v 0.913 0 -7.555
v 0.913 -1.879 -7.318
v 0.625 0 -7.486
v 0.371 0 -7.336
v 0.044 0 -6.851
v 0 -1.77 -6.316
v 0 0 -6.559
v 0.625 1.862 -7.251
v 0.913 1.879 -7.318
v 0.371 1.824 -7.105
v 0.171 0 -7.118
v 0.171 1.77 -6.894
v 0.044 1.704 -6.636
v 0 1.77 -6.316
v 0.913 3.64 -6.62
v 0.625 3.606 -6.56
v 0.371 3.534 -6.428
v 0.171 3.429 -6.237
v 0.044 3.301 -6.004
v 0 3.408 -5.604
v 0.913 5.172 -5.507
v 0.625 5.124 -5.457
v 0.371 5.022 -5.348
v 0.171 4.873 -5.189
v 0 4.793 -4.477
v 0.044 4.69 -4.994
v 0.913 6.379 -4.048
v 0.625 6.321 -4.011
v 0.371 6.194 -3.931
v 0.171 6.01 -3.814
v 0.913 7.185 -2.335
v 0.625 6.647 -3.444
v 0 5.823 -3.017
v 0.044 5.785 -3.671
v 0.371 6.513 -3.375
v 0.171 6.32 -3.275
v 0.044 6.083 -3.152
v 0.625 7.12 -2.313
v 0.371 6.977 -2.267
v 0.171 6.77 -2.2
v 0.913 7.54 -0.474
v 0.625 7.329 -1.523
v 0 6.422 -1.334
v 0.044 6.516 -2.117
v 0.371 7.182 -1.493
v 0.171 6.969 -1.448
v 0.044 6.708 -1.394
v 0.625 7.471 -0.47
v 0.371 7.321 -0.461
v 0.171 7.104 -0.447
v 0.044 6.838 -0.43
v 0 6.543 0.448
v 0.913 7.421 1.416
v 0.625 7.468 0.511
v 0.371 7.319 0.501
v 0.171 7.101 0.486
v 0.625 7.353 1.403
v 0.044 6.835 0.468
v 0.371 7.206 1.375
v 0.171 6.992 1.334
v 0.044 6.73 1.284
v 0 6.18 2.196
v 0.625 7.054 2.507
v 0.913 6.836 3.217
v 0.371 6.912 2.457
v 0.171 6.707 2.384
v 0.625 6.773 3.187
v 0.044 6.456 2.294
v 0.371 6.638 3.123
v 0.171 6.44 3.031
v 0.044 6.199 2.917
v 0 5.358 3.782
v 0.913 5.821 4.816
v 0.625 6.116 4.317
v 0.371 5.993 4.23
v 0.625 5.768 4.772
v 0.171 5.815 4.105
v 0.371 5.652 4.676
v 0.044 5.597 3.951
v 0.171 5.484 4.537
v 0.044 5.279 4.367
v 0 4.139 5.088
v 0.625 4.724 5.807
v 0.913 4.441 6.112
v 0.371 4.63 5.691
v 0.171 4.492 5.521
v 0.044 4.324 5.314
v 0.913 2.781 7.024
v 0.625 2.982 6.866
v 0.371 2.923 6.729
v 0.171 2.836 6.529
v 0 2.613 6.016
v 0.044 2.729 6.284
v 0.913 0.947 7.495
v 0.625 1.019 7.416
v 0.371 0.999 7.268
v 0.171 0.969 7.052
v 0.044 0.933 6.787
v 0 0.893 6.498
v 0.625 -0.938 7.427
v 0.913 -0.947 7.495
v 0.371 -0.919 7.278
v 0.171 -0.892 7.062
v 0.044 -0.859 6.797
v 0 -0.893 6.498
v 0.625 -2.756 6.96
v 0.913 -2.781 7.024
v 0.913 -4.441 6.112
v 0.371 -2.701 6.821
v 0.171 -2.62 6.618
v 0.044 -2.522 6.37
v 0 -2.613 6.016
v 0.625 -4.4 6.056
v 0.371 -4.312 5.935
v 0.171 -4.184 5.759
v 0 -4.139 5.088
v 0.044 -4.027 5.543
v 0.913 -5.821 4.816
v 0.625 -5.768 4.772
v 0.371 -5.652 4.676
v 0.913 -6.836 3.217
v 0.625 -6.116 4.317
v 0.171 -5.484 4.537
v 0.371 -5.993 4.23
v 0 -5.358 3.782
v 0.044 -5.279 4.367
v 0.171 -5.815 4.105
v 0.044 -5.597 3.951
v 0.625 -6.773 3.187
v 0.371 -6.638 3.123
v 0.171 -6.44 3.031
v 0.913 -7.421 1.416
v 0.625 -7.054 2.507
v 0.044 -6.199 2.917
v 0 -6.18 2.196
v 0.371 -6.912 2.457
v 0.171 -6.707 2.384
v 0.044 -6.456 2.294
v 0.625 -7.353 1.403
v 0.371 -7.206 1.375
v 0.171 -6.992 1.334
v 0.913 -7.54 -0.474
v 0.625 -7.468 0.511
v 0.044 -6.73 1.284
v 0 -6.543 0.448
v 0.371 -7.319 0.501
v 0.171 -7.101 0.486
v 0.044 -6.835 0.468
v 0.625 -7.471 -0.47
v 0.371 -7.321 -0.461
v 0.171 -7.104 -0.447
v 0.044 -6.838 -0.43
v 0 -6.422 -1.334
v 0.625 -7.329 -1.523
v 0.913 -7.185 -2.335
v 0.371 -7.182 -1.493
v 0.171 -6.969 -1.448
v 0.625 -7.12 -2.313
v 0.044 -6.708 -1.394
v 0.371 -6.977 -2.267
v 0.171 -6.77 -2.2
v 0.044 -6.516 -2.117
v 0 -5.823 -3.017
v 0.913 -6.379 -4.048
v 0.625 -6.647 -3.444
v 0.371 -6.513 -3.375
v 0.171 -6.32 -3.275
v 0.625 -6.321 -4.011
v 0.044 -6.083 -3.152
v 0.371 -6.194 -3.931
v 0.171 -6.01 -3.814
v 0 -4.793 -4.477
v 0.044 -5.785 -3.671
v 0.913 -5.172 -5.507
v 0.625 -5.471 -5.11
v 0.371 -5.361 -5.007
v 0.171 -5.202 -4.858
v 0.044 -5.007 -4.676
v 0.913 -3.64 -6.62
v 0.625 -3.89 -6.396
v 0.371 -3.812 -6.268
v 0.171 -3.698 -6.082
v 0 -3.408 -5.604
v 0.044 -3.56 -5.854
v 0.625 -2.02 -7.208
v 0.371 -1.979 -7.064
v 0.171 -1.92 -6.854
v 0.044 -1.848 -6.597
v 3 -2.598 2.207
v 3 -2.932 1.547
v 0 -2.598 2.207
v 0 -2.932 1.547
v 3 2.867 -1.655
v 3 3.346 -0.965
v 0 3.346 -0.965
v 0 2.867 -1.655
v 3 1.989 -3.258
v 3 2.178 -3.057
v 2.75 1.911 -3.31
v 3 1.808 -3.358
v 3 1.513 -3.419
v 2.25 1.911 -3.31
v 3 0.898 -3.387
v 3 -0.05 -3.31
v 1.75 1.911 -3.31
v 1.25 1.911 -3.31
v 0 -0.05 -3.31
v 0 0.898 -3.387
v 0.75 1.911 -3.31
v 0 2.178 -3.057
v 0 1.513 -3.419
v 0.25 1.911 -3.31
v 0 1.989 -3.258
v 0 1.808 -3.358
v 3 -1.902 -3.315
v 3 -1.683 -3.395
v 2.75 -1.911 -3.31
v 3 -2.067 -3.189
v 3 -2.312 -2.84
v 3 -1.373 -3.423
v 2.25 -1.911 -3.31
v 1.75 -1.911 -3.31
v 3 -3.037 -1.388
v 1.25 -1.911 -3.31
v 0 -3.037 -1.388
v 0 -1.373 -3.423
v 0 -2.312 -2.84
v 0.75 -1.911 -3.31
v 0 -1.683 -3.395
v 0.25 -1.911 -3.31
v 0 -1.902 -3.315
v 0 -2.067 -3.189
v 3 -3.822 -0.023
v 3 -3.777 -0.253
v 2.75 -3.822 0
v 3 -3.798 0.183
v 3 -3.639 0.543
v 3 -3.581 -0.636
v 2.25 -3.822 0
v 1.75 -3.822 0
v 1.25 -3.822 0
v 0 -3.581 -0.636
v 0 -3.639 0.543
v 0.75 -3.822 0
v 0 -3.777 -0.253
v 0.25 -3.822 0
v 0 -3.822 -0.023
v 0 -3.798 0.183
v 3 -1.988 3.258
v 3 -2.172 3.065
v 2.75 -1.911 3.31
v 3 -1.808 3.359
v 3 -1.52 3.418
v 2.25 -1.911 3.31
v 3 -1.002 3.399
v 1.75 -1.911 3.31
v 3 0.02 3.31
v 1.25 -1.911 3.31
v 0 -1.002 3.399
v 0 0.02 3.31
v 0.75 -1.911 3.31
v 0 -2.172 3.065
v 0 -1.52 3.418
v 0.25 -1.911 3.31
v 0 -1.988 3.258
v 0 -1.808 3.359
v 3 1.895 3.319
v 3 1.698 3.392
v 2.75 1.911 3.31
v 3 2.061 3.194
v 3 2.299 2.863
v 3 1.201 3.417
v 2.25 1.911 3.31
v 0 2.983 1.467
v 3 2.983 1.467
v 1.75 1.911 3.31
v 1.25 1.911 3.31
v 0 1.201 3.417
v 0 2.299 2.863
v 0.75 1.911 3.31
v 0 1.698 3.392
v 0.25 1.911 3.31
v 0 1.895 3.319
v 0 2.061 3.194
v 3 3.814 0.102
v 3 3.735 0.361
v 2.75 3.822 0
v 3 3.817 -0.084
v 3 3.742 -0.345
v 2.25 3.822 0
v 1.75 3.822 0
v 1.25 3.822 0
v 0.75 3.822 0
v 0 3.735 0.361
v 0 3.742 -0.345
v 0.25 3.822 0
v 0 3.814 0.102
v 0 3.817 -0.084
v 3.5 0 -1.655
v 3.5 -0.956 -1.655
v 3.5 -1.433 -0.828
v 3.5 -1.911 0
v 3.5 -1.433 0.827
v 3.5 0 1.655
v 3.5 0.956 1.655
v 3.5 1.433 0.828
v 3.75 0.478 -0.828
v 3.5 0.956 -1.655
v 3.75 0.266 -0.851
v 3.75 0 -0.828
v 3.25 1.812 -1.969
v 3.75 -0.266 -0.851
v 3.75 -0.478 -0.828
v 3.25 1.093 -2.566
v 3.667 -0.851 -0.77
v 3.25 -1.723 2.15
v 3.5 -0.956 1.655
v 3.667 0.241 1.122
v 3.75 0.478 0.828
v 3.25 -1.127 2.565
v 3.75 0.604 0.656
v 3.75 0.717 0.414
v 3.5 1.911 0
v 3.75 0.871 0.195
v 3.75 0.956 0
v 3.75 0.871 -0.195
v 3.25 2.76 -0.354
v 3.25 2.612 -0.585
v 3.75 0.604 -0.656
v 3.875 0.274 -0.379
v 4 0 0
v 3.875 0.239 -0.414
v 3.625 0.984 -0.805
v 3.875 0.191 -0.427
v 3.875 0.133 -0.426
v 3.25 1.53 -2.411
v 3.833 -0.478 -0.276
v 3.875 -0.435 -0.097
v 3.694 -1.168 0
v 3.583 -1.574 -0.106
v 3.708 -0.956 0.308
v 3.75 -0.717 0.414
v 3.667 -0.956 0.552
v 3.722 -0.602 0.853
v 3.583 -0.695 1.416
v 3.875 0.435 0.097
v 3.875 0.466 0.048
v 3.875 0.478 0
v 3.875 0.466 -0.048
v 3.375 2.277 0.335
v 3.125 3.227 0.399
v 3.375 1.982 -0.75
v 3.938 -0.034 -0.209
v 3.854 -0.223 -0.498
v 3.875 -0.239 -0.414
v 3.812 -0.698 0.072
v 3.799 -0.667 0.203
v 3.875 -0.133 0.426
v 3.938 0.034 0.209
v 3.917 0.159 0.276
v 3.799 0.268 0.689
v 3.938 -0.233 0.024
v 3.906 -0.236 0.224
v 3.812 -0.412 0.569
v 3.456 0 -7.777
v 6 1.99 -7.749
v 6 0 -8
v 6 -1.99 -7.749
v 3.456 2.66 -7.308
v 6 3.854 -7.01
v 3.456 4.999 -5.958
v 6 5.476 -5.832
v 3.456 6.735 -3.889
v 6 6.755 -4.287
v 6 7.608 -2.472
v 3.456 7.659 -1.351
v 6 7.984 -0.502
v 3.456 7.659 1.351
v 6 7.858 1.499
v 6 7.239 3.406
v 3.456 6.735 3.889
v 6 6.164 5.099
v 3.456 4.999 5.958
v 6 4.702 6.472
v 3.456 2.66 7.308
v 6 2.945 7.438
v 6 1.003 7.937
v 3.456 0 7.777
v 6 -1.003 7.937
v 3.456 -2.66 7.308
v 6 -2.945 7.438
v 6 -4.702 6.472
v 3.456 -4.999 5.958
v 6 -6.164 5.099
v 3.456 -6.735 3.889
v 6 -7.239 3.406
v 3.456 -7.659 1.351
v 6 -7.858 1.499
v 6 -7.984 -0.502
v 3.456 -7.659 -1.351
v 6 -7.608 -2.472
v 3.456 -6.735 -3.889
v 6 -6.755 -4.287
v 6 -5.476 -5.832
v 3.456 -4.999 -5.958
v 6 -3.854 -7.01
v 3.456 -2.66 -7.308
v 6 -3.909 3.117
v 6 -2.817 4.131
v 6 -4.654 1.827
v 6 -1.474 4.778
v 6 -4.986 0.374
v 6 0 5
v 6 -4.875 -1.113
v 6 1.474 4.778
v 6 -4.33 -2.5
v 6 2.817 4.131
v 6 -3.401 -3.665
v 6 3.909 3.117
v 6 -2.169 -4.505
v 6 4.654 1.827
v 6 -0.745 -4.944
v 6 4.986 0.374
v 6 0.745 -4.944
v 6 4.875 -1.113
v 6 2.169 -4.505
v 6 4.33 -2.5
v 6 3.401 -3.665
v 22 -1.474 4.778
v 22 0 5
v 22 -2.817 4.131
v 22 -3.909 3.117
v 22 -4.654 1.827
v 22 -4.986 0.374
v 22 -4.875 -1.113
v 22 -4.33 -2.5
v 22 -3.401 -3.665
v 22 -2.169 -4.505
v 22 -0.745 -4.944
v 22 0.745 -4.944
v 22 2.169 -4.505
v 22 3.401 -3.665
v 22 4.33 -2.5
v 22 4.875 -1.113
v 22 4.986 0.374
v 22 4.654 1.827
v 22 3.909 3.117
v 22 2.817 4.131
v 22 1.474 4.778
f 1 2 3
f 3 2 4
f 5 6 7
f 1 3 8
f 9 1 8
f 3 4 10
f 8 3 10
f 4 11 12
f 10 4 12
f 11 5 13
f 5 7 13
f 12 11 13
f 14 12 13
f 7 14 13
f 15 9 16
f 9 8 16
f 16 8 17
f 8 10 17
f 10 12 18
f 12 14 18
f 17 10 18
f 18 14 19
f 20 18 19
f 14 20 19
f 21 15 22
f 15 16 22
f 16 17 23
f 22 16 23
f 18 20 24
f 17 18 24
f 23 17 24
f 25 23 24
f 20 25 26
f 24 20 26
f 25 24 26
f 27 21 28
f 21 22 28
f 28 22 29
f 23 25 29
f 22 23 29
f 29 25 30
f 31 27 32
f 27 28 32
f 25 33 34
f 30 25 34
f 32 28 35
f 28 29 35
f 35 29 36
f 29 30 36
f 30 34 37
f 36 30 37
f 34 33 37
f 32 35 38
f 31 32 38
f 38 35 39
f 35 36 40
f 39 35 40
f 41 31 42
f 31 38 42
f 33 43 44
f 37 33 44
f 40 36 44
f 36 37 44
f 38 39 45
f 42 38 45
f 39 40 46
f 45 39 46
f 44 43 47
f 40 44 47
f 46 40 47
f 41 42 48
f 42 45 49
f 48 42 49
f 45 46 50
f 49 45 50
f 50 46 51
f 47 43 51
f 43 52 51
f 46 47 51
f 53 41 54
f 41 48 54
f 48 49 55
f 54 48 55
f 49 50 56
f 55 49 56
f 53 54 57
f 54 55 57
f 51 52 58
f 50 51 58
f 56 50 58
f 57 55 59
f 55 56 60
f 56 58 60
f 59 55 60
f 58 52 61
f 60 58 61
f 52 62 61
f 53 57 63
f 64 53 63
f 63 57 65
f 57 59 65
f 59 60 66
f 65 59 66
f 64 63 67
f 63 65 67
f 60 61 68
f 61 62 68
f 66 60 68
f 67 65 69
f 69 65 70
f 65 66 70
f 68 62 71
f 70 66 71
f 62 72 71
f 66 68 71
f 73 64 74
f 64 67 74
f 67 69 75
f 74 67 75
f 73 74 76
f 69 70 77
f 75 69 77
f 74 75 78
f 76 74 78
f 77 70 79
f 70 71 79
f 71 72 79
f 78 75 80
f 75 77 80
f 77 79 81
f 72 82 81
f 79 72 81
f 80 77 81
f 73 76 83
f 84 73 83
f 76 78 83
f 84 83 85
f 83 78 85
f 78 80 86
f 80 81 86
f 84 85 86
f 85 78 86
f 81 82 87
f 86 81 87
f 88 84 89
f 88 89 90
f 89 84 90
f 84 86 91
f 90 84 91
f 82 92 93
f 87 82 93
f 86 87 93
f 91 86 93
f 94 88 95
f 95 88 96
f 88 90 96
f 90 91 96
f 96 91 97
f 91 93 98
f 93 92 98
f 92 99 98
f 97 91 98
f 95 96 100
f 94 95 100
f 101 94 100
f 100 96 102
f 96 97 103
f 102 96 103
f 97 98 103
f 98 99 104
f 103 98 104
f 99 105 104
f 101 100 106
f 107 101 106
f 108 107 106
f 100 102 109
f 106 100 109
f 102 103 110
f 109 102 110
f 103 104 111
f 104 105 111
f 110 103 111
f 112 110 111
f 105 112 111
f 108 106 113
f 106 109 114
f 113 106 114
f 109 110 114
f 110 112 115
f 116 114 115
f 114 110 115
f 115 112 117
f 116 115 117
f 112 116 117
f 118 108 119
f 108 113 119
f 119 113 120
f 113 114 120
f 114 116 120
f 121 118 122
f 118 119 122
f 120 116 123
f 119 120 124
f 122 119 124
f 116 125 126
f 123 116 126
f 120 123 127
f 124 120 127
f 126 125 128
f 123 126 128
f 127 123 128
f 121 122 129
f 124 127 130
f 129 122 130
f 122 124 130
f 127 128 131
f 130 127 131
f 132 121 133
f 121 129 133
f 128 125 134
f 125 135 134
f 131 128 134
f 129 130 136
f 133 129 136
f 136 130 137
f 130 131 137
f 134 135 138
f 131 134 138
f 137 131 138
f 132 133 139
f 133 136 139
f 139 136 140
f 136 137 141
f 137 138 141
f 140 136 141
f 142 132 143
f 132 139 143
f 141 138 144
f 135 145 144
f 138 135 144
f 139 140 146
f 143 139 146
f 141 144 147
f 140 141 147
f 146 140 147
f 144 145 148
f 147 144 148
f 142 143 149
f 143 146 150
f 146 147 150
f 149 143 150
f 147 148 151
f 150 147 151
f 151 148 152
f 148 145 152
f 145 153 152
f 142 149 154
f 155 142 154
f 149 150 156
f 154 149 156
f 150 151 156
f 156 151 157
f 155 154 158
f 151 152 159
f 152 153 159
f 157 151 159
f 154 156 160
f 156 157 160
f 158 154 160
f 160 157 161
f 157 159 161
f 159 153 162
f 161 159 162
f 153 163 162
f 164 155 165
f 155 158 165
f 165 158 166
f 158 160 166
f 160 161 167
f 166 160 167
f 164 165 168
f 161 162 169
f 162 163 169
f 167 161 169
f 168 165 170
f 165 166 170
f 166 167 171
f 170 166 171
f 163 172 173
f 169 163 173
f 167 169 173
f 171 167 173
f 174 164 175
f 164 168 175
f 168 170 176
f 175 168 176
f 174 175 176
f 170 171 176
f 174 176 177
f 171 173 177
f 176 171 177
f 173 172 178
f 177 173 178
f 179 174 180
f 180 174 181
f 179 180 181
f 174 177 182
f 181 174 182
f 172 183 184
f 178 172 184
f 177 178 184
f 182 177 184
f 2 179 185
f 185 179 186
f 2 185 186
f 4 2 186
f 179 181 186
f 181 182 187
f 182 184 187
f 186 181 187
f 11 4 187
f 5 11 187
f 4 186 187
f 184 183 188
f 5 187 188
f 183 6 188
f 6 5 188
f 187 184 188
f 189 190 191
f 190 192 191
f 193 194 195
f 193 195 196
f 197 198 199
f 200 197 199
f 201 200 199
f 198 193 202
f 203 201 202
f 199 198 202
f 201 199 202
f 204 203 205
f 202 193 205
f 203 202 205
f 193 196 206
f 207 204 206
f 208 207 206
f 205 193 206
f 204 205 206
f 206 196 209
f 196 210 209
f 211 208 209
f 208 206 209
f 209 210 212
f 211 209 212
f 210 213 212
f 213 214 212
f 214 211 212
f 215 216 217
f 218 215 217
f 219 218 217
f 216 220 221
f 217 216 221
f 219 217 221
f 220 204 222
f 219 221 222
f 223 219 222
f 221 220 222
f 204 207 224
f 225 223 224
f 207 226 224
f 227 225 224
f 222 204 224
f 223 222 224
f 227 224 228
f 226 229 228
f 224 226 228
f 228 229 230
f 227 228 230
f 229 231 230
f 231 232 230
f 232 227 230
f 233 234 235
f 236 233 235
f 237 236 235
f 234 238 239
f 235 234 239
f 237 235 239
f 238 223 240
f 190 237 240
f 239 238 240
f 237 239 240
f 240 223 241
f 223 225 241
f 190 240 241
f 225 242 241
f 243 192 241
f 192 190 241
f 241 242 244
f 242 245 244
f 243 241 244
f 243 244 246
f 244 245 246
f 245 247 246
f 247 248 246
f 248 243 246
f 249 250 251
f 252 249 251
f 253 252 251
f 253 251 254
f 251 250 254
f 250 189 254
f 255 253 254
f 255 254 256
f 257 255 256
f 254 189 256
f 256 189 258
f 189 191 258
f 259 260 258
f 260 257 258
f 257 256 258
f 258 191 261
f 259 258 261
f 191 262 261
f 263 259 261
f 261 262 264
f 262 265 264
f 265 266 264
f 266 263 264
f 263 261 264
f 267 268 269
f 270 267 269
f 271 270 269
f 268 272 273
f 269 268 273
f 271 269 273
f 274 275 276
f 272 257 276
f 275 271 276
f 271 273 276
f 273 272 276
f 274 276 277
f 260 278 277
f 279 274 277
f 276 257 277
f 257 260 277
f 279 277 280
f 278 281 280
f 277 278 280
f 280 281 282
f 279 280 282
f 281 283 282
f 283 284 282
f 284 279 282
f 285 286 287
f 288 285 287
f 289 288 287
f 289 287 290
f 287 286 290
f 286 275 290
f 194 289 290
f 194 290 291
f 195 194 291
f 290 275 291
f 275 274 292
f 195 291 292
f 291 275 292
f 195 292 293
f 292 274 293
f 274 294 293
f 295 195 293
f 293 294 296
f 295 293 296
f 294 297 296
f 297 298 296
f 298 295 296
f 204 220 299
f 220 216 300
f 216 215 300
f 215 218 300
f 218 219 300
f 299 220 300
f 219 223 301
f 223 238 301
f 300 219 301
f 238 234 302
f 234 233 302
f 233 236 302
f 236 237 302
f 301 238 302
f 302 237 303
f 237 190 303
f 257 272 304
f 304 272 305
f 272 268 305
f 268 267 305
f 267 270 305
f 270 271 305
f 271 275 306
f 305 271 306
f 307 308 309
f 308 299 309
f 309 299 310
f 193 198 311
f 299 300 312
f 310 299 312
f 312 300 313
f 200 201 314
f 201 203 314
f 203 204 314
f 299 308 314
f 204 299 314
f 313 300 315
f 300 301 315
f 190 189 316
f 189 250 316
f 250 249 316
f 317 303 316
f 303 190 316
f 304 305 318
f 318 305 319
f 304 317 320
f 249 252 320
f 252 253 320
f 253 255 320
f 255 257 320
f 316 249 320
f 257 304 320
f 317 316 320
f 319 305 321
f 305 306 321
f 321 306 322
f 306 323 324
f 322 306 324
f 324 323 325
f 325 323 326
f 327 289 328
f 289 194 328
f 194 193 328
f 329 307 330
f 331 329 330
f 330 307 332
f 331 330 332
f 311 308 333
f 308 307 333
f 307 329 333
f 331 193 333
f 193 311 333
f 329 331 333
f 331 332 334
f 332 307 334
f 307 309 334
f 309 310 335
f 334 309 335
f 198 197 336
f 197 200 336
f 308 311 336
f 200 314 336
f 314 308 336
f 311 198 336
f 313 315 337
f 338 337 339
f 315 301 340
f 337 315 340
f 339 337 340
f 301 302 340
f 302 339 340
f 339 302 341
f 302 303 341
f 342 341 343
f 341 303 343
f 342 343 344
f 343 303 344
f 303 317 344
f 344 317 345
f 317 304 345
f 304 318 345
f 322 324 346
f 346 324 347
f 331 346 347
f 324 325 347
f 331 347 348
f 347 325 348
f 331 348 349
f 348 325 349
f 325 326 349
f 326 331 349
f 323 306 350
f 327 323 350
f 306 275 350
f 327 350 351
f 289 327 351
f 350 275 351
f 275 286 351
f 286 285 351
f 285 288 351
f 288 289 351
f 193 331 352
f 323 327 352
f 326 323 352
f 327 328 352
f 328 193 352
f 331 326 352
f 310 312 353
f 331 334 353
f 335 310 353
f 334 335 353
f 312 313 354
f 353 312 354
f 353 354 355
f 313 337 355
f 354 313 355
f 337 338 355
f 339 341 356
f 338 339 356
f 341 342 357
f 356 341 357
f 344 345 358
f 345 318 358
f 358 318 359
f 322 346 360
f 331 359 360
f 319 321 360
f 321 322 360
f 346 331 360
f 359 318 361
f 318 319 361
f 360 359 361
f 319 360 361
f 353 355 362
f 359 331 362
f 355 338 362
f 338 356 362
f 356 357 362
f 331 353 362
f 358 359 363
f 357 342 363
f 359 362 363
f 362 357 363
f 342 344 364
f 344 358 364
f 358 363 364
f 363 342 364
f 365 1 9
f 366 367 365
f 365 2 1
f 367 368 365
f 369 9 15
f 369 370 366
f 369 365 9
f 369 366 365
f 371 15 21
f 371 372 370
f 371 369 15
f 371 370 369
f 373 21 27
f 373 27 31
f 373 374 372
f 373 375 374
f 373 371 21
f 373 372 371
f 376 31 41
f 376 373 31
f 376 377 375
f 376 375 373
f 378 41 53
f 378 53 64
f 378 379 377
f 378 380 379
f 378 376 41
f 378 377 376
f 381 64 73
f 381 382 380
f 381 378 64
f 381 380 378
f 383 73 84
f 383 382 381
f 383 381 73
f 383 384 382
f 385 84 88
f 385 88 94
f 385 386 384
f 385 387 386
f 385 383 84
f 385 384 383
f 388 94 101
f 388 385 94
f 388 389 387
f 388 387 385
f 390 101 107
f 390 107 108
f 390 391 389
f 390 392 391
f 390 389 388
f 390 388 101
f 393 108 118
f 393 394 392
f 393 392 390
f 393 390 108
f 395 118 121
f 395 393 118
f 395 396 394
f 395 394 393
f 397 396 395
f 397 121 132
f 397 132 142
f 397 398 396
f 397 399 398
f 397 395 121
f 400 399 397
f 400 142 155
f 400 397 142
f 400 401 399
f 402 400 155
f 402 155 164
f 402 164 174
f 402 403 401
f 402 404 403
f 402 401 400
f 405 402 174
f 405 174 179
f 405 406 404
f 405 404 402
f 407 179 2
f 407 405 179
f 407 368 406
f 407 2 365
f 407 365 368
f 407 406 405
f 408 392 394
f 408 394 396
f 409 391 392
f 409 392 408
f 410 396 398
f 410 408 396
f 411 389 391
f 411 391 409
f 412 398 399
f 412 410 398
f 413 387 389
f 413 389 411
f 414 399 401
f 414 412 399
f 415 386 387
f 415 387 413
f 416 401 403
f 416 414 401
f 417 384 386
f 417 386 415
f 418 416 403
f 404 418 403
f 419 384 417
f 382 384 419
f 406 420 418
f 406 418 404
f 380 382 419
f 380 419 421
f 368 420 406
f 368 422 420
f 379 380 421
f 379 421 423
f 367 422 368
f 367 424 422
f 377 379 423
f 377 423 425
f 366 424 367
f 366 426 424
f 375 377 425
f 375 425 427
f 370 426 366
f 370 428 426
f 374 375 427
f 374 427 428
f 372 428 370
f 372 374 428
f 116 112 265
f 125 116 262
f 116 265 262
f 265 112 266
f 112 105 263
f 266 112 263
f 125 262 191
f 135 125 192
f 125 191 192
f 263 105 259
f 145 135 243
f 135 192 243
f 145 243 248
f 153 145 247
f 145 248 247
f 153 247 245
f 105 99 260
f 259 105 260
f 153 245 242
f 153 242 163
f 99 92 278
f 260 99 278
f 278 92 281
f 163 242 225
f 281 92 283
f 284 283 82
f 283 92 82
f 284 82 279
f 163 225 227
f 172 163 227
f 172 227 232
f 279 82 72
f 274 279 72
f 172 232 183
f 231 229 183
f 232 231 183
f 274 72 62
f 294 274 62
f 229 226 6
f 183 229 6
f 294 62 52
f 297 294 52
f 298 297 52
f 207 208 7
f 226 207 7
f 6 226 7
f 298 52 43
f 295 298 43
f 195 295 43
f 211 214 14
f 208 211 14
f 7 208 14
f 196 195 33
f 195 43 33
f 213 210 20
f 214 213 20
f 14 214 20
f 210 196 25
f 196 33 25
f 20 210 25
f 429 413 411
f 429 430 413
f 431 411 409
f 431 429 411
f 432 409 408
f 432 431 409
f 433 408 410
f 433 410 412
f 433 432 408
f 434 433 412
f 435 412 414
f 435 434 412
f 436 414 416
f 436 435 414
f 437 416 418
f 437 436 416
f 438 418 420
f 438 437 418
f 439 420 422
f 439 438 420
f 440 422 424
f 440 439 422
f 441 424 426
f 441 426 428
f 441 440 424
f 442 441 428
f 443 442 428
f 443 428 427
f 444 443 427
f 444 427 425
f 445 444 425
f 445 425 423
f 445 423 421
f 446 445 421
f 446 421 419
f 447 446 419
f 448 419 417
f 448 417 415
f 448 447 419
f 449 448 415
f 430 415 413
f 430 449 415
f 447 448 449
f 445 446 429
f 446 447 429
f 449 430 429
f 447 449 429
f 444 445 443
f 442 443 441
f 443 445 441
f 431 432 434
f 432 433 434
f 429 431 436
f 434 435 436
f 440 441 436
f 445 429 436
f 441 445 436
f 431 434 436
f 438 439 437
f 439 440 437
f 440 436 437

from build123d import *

# Parameters (mm, degrees)
SKETCH1_R      = 8
BASEHEAD_DEPTH = 6
BASEHEAD_DRAFT = -5
SKETCH8_W      = 16
SKETCH8_H      = 5
SOCKET_DEPTH   = 3
HEADFILLET2_R  = 1


with BuildPart() as part:
    # Sketch1 → BaseHead (with draft: the straight prism first)
    with BuildSketch(Plane(origin=(6, 0, 0), x_dir=(0, 0, -1), z_dir=(1, 0, 0))):
        Circle(SKETCH1_R)
    extrude(amount=-BASEHEAD_DEPTH)
    # BaseHead: the draft: its side faces are tilted about the plane it starts from
    basehead_sides = [part.faces().sort_by_distance(p)[0] for p in [
        (3, 0, 8),
    ]]
    draft(basehead_sides, Plane(origin=(6, 0, 0), x_dir=(0, 0, -1), z_dir=(1, 0, 0)), BASEHEAD_DRAFT)

    # Sketch8 → Revolve1 (revolve)
    with BuildSketch(Plane.XY, mode=Mode.PRIVATE) as revolve1_sk:
        with Locations((14, 2.5)):
            Rectangle(SKETCH8_W, SKETCH8_H)
    revolve(revolve1_sk.sketch.rotate(Axis((0, 0, 0), (1, 0, 0)), 90), axis=Axis((0, 0, 0), (1, 0, 0)))

    # Sketch4 → Socket (cut)
    with BuildSketch(Plane(origin=(0, 0, 0), x_dir=(0, 0, -1), z_dir=(1, 0, 0))):
        with BuildLine():
            add(Edge.make_bspline(
                [(1.655, 2.866544087), (2.291538462, 2.499038434), (3.819230769, 2.205033913), (3.055384615, 0), (3.819230769, -2.205033913), (1.527692308, -2.646040695), (0, -4.410067825), (-1.527692308, -2.646040695), (-3.819230769, -2.205033913), (-3.055384615, 0), (-3.819230769, 2.205033913), (-1.527692308, 2.646040695), (0, 4.410067825), (1.018461538, 3.234049739), (1.655, 2.866544087)],
                knots=[0, 0, 0, 0, 0.083333333, 0.166666667, 0.25, 0.333333333, 0.416666667, 0.5, 0.583333333, 0.666666667, 0.75, 0.833333333, 0.916666667, 1, 1, 1, 1], degree=3))
        make_face()
    extrude(amount=SOCKET_DEPTH, mode=Mode.SUBTRACT)

    # Sketch5 → Cut-Loft1 section 0
    with BuildSketch(Plane.ZY.offset(-3), mode=Mode.PRIVATE) as cut_loft1_s0:
        with BuildLine():
            add(Edge.make_bspline(
                [(-1.655, 2.866544087), (-2.291538462, 2.499038434), (-3.819230769, 2.205033913), (-3.055384615, 0), (-3.819230769, -2.205033913), (-1.527692308, -2.646040695), (0, -4.410067825), (1.527692308, -2.646040695), (3.819230769, -2.205033913), (3.055384615, 0), (3.819230769, 2.205033913), (1.527692308, 2.646040695), (0, 4.410067825), (-1.018461538, 3.234049739), (-1.655, 2.866544087)],
                knots=[0, 0, 0, 0, 0.083333333, 0.166666667, 0.25, 0.333333333, 0.416666667, 0.5, 0.583333333, 0.666666667, 0.75, 0.833333333, 0.916666667, 1, 1, 1, 1], degree=3))
        make_face()
    loft([Vertex(4, 0, 0), cut_loft1_s0.sketch], mode=Mode.SUBTRACT)

    # HeadFillet2
    headfillet2_edges = [part.edges().sort_by_distance(p)[0] for p in [
        (0, 0, 7.475068019),
    ]]
    fillet(headfillet2_edges, radius=HEADFILLET2_R)


solid = part.part
